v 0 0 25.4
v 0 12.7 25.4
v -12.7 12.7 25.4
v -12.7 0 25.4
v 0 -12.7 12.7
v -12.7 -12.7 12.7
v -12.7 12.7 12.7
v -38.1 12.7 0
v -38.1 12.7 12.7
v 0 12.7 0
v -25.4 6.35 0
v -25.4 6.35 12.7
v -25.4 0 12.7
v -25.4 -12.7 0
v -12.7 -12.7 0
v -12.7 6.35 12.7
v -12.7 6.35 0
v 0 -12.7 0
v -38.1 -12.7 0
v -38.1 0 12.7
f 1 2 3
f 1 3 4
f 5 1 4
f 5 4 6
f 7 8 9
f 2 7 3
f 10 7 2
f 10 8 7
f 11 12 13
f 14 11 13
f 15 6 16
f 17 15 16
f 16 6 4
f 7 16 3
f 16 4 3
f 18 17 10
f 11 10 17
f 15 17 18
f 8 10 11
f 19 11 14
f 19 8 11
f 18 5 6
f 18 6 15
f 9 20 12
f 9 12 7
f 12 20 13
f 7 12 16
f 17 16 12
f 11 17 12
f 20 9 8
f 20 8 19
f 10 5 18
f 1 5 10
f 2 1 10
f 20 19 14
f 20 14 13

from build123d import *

# Parameters (mm, degrees)
F1_DEPTH = 12.7
F3_DEPTH = 12.7
F5_DEPTH = 12.7


with BuildPart() as f1:
    # F0 (on Right) → F1 (new body)
    with BuildSketch(Plane.YZ):
        Polygon((-12.7, 12.7), (-12.7, 0), (12.7, 0), (12.7, 25.4), (0, 25.4), align=None)
    extrude(amount=-F1_DEPTH)

    # F2 (on face) → F3 (join)
    with BuildSketch(Plane(origin=(0, 0, 0), x_dir=(1, 0, 0), z_dir=(0, 0, -1))):
        Polygon((-38.1, -12.7), (-12.7, -12.7), (-12.7, -6.35), (-25.4, -6.35), (-25.4, 0), (-38.1, 0), align=None)
    extrude(amount=-F3_DEPTH)

    # F4 (on face) → F5 (join)
    with BuildSketch(Plane(origin=(-38.1, 0, 0), x_dir=(0, -1, 0), z_dir=(-1, 0, 0))):
        Polygon((12.7, 0), (0, 12.7), (0, 0), align=None)
    extrude(amount=-F5_DEPTH)


solid = f1.part
